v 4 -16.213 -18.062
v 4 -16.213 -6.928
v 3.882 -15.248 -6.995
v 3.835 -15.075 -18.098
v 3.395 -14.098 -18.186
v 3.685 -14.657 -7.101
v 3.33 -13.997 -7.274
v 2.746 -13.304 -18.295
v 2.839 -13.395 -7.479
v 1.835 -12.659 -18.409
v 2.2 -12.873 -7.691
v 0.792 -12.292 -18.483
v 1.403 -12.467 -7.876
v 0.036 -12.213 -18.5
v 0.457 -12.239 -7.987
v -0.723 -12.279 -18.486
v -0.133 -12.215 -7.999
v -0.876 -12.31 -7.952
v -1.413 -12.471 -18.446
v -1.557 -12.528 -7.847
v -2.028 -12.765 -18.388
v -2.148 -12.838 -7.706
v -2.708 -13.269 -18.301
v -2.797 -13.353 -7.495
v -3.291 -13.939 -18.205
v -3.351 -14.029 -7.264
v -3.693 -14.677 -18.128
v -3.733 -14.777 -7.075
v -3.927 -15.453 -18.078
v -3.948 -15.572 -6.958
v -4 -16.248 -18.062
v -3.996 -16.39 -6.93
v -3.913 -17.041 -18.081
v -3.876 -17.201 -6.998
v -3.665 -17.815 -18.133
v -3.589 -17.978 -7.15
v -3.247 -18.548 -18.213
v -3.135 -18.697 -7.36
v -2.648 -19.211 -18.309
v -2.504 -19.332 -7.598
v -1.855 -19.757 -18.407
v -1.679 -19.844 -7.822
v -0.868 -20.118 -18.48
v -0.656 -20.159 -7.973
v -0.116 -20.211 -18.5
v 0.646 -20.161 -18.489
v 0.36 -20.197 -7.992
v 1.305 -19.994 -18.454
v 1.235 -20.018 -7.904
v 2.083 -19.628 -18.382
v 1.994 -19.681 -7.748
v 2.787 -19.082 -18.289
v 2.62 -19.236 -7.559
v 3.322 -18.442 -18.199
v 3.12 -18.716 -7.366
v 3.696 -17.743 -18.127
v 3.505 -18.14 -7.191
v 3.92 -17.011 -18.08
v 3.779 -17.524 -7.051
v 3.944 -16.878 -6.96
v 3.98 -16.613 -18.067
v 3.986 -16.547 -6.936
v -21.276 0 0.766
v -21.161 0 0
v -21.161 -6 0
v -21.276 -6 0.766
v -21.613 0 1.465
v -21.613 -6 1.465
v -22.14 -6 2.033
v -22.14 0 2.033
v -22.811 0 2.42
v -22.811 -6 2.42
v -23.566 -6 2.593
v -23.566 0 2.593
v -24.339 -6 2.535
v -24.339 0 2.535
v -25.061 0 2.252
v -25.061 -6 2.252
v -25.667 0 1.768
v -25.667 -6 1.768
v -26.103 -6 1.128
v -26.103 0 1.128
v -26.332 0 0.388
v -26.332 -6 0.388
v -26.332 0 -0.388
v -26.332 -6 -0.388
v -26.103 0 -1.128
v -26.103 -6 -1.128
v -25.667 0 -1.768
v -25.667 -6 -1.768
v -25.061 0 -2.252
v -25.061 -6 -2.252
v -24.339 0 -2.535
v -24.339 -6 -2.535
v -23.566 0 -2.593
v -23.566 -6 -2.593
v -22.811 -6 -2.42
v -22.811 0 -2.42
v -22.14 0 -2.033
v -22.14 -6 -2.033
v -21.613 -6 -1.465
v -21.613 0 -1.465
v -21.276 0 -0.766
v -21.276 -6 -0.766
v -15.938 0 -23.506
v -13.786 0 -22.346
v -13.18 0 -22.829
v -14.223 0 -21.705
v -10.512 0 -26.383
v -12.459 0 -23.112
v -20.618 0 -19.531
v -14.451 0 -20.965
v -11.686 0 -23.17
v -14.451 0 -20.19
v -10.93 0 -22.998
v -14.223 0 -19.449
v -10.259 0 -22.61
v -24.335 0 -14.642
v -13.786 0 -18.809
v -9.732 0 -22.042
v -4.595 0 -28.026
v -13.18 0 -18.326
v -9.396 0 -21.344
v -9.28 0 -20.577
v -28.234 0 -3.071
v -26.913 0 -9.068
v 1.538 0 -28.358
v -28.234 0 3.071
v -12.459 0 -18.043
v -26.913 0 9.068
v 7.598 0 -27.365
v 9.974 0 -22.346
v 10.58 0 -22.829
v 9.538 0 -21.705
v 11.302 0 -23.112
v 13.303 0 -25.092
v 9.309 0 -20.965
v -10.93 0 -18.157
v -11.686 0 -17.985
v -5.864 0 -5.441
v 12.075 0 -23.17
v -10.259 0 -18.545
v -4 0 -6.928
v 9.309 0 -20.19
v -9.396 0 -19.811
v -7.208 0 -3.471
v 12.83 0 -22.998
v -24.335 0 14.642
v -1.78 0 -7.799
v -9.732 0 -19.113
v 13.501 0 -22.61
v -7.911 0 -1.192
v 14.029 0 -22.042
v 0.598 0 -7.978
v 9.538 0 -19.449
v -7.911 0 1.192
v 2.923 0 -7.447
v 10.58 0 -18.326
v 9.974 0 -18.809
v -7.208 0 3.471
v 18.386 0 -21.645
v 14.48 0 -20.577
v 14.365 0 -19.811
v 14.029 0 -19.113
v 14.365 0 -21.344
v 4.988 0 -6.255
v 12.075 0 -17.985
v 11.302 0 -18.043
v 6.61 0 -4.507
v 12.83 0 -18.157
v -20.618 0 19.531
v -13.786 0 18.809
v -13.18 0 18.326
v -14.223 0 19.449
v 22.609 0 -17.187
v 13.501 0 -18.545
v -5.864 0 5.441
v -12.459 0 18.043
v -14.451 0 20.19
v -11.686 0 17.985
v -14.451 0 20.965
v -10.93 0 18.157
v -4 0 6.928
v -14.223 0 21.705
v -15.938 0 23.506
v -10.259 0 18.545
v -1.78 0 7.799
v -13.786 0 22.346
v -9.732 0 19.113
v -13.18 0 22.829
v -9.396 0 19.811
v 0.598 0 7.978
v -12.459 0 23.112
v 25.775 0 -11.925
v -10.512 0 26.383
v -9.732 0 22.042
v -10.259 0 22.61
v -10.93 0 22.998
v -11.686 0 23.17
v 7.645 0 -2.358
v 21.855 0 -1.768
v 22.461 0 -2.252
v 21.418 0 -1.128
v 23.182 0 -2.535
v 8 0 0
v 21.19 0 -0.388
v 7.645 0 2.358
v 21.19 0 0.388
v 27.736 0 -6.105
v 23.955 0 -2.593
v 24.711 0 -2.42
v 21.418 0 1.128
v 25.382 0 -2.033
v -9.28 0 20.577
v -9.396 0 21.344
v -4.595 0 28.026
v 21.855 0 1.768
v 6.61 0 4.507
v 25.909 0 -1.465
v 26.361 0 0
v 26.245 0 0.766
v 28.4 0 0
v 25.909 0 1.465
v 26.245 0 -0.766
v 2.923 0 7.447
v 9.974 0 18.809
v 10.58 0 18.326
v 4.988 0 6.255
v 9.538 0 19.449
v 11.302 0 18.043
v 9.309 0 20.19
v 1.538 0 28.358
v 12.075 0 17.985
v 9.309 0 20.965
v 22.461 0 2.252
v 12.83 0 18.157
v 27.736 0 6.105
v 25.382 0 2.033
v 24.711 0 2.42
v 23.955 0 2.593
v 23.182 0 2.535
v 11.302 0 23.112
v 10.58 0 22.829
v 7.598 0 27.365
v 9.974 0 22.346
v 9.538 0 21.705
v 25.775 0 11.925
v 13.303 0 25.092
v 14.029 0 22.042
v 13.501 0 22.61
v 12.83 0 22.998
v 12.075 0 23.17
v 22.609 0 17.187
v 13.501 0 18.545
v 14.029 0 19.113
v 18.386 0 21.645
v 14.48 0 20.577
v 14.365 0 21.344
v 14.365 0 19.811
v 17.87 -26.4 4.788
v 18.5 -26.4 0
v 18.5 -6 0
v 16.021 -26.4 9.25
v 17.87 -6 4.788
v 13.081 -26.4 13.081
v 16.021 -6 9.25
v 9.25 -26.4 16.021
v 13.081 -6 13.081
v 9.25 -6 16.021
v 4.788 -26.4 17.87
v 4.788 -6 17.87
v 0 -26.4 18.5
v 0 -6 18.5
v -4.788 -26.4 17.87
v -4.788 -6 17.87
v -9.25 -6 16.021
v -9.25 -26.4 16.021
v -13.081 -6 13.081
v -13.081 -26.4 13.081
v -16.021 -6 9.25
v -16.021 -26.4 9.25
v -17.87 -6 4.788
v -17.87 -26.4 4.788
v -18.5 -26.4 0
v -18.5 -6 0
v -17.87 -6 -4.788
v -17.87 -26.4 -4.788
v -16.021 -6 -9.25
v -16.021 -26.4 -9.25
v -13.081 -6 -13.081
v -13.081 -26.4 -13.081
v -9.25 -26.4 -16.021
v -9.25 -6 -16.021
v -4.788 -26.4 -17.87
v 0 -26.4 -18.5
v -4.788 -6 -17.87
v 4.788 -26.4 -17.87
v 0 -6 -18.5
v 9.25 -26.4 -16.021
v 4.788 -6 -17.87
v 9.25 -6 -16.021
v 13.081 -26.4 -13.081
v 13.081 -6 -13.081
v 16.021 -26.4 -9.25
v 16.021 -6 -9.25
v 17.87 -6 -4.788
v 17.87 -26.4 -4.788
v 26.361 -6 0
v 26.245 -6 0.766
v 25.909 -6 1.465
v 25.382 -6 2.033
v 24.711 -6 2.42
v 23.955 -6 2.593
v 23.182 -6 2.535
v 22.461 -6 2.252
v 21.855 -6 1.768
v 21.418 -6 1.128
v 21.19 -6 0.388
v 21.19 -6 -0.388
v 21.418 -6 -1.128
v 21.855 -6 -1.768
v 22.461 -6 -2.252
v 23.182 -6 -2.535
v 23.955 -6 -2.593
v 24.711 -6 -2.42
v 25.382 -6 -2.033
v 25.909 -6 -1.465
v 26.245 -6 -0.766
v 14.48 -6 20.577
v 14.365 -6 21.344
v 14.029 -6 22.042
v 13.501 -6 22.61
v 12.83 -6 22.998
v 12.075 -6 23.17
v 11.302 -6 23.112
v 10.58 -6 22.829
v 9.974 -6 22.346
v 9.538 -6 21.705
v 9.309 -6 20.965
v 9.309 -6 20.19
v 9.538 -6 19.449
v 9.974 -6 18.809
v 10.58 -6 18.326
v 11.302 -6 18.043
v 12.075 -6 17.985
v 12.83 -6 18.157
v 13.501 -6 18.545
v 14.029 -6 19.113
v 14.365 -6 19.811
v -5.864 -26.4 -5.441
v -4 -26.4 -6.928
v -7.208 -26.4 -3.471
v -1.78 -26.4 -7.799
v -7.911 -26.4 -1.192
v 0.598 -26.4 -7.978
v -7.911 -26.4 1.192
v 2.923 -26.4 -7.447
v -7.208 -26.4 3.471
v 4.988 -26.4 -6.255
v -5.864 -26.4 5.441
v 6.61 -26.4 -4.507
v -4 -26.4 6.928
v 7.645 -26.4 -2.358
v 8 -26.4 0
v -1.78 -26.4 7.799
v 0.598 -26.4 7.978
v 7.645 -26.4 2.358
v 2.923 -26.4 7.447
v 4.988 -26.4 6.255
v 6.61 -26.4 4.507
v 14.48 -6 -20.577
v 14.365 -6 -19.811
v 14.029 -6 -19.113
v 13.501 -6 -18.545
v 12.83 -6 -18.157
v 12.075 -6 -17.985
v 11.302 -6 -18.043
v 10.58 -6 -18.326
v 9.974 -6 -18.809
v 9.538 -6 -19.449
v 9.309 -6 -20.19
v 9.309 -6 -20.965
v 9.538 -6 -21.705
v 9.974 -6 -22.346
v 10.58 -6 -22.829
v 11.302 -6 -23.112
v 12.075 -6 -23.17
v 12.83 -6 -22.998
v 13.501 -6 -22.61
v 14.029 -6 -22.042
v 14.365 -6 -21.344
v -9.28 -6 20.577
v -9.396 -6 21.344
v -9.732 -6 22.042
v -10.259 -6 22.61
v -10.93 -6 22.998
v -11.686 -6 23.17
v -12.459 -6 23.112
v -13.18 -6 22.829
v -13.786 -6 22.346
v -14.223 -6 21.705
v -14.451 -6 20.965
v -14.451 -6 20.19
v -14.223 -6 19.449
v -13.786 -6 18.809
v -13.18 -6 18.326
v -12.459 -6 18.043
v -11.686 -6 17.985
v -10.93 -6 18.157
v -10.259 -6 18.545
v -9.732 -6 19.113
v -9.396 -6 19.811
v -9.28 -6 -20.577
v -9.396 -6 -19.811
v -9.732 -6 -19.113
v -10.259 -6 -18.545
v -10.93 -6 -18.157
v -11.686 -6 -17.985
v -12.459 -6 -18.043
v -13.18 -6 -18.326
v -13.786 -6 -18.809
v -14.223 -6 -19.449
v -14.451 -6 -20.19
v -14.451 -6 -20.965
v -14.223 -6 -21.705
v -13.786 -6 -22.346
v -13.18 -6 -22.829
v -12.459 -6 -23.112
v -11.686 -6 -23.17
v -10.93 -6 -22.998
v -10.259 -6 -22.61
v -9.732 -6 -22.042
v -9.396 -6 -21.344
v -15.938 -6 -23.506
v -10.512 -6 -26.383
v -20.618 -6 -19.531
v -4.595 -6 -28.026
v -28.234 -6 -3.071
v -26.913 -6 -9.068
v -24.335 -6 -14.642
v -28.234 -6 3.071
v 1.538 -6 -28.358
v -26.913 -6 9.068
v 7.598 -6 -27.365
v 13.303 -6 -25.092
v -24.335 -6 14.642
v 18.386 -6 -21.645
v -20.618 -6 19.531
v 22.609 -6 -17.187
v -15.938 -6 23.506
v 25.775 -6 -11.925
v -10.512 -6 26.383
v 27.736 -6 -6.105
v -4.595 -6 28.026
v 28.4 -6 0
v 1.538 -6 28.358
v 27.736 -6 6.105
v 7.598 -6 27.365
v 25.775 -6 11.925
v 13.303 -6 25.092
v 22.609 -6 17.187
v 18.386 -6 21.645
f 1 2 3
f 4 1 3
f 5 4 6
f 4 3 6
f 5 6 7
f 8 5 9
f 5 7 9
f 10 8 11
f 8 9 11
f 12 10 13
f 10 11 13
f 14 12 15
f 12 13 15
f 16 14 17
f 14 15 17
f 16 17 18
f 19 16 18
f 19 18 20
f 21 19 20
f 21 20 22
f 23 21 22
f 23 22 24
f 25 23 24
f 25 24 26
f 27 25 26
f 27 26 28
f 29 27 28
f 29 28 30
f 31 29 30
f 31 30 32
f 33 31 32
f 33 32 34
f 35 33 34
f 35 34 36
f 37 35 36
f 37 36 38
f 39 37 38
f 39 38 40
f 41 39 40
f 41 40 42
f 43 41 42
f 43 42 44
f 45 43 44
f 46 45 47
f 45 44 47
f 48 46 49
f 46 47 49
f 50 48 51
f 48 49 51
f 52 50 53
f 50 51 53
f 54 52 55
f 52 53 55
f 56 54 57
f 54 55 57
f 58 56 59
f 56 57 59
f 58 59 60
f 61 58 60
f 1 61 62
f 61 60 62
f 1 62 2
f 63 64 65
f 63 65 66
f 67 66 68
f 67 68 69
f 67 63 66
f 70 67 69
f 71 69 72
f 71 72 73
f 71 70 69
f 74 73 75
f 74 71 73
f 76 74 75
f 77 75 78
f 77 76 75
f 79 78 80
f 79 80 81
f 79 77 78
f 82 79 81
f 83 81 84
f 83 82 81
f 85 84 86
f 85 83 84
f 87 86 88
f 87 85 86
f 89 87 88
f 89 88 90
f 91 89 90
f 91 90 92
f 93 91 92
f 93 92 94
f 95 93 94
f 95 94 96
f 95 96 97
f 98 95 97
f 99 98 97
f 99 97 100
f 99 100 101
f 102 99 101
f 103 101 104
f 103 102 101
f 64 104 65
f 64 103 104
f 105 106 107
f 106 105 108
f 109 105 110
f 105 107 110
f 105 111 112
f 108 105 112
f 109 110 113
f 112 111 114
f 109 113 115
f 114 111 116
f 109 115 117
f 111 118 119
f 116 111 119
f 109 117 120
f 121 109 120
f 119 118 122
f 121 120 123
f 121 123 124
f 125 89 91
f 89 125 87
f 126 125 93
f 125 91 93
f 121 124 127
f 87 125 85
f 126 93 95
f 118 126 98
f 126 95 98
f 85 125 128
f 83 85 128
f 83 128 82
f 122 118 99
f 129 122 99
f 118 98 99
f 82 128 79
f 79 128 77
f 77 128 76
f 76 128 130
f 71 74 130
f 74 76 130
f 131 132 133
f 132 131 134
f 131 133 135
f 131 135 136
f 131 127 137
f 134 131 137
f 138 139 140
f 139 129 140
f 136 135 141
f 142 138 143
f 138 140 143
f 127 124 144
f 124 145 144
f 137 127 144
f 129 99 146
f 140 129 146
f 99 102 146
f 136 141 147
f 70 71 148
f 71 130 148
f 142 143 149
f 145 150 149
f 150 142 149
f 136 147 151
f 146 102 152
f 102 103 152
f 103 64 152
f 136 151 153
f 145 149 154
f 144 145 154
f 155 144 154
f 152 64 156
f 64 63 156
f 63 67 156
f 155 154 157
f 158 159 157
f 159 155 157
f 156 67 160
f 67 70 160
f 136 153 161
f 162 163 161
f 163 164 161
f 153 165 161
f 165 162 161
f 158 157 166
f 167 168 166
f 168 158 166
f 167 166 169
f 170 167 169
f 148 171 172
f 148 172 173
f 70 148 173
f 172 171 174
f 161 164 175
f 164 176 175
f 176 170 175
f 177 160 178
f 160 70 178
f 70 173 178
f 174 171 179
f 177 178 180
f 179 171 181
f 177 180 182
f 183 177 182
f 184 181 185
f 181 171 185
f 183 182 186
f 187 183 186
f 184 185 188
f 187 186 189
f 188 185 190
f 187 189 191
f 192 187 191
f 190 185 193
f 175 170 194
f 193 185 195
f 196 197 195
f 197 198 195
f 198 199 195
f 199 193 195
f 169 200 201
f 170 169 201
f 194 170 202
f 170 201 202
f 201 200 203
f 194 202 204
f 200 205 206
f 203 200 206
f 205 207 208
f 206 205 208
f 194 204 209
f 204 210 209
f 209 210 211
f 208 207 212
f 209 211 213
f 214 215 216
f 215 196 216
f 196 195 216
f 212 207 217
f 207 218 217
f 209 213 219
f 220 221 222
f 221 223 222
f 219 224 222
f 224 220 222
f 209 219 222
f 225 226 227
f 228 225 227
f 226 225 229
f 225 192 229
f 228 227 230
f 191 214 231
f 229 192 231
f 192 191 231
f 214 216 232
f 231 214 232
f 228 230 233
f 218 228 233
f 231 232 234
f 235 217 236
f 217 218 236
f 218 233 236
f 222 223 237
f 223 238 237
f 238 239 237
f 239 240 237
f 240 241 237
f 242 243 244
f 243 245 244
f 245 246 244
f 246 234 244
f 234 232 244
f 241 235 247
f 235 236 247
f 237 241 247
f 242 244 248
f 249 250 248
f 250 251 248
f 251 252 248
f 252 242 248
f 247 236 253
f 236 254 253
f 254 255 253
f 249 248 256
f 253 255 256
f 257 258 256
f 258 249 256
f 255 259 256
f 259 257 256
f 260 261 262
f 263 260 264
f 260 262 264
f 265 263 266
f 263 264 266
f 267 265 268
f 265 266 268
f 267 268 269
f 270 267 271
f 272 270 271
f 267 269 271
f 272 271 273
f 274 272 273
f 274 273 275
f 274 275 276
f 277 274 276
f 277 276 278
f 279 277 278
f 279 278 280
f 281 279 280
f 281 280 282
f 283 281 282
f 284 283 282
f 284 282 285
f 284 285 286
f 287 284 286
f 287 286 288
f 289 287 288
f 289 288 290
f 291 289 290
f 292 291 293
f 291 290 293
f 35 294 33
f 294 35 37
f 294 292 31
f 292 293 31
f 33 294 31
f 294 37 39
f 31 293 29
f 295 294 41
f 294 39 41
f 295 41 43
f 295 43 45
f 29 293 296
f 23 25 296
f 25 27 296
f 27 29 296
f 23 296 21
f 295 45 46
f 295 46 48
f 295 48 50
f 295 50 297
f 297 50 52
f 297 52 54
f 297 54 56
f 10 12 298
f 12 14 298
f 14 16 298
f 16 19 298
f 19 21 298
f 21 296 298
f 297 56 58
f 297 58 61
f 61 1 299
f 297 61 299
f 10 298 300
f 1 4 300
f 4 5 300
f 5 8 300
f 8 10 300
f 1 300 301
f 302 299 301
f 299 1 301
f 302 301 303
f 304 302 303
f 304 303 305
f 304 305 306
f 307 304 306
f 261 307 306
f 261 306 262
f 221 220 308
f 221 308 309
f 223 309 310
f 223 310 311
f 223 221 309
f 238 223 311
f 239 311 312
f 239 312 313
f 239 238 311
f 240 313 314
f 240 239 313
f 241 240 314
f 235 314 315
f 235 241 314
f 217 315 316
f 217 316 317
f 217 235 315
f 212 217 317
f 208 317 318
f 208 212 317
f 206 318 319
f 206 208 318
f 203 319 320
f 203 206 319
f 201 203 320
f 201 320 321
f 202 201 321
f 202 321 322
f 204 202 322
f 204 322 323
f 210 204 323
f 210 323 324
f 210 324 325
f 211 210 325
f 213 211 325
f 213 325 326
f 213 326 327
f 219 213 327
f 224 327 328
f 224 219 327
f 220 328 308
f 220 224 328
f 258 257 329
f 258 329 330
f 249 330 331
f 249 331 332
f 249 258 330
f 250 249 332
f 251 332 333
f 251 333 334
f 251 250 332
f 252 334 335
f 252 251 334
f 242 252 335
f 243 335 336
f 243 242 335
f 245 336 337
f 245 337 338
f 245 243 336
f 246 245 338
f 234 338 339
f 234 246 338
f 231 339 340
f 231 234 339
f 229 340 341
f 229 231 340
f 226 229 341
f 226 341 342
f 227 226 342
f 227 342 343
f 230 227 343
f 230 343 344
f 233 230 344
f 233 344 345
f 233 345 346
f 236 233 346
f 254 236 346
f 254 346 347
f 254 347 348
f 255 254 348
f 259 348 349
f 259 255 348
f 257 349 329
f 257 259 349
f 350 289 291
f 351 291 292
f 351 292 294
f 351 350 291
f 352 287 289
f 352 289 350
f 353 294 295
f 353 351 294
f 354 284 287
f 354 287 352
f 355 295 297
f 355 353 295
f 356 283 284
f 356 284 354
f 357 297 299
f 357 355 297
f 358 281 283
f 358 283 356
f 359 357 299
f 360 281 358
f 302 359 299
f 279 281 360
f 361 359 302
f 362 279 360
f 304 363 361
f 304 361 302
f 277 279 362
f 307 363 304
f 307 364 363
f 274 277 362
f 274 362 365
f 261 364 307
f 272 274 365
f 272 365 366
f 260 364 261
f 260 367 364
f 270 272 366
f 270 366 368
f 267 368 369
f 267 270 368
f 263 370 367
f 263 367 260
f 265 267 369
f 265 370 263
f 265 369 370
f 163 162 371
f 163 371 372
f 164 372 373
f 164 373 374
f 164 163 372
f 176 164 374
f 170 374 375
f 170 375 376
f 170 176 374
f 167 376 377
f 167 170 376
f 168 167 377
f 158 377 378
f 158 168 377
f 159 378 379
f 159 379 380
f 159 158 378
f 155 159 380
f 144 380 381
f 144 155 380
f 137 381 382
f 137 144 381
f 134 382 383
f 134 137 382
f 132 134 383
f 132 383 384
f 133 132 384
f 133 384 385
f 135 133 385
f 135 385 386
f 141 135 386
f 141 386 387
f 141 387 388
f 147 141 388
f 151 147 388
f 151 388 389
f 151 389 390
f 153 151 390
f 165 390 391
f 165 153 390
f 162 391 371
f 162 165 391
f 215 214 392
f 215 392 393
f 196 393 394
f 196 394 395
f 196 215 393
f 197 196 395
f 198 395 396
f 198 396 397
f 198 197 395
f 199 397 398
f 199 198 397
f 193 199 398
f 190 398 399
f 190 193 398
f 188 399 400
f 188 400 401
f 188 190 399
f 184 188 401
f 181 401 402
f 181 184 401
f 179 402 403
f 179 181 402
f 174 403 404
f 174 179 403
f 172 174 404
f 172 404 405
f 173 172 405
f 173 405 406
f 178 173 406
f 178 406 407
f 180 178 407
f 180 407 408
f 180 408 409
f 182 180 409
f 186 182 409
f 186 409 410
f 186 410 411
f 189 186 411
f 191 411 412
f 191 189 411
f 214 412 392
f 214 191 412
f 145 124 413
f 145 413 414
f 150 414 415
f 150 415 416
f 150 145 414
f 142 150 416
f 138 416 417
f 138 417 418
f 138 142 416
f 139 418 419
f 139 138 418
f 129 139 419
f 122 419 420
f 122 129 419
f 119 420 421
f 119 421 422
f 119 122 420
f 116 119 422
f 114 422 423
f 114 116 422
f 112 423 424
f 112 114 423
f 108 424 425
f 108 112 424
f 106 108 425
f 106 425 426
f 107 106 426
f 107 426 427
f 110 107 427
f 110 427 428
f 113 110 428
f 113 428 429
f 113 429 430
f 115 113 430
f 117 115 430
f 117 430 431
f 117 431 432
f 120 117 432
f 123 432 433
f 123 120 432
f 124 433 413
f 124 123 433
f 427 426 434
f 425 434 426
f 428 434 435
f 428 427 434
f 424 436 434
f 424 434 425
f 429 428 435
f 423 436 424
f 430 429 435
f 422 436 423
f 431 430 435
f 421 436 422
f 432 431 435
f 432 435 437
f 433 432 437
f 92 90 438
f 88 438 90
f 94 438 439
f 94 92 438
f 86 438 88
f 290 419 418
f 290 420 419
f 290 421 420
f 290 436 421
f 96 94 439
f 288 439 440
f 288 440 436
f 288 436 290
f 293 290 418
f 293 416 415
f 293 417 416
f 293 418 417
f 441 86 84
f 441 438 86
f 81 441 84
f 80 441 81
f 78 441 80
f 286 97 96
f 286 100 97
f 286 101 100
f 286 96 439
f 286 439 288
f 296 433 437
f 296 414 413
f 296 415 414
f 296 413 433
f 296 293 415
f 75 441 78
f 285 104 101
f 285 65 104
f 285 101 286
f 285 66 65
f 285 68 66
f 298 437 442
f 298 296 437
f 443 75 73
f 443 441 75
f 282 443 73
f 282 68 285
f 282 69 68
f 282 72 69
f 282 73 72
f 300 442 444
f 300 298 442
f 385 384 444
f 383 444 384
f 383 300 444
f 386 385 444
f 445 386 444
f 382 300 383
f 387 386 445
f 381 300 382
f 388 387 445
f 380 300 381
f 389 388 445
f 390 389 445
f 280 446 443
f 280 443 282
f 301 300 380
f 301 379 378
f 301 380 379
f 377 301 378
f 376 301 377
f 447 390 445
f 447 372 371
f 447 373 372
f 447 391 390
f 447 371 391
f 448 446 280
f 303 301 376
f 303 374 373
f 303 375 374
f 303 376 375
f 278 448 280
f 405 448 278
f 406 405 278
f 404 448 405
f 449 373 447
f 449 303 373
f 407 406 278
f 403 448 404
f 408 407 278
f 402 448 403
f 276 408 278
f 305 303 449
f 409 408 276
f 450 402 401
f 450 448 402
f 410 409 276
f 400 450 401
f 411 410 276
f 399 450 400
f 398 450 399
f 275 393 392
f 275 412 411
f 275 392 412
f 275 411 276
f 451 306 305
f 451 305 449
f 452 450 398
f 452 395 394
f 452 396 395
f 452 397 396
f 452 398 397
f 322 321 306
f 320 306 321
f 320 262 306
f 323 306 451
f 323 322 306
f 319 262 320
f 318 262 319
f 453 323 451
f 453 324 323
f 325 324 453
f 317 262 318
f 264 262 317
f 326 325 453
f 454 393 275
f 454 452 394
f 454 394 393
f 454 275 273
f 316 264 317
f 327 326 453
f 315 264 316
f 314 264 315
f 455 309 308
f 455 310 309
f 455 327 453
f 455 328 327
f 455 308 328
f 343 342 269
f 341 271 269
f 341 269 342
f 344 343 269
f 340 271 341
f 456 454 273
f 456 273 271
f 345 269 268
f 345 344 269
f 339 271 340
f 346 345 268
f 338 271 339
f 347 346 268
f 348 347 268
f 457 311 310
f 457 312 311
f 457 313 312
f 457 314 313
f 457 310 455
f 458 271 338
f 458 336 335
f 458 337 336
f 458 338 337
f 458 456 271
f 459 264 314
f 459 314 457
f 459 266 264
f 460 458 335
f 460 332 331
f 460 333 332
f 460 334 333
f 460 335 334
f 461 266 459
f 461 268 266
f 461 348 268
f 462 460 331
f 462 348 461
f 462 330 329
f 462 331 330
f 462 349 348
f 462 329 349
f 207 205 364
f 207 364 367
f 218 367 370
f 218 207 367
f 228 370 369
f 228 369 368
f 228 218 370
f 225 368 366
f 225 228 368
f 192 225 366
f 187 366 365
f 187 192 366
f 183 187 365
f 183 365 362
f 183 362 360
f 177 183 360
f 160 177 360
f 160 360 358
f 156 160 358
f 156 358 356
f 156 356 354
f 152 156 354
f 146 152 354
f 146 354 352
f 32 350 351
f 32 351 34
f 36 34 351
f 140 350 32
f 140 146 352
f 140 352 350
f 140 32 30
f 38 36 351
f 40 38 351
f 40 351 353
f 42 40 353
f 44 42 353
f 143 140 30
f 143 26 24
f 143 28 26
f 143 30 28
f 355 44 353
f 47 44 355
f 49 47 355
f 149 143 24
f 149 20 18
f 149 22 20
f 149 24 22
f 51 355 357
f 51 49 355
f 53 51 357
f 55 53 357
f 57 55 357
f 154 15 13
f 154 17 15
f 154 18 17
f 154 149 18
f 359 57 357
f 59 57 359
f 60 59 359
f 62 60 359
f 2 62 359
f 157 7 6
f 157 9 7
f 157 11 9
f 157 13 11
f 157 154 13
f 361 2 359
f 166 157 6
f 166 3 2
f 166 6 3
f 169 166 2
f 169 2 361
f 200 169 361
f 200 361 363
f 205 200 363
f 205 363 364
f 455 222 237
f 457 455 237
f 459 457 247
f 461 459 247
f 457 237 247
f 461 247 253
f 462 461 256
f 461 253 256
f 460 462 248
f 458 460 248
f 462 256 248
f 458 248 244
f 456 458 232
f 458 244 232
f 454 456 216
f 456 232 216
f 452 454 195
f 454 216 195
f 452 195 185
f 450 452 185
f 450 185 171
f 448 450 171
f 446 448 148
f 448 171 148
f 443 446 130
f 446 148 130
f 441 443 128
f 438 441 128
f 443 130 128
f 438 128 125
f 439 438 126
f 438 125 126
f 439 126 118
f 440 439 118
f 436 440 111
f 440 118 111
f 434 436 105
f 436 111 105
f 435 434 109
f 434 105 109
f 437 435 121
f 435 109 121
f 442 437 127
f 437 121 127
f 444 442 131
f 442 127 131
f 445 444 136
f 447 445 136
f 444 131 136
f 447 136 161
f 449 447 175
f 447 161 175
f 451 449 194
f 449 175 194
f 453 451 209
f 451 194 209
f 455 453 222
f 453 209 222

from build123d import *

# Parameters (mm, degrees)
F1_R     = 18.5
F4_DEPTH = 26.4
F2_R     = 28.4
F5_DEPTH = 6
F0_R     = 8
F6_DEPTH = 26.4
F3_R     = 2.6
F7_DEPTH = 6
F8_R     = 4
F9_DEPTH = 28


with BuildPart() as f4:
    # F1 (on Front) → F4 (new body)
    with BuildSketch(Plane.XZ):
        Circle(F1_R)
    extrude(amount=F4_DEPTH)

    # F2 (on Front) → F5 (join)
    with BuildSketch(Plane.XZ):
        Circle(F2_R)
    extrude(amount=F5_DEPTH)

    # F0 (on Front) → F6 (cut)
    with BuildSketch(Plane.XZ):
        Circle(F0_R)
    extrude(amount=F6_DEPTH, mode=Mode.SUBTRACT)

    # F3 (on Front) → F7 (cut)
    with BuildSketch(Plane.XZ):
        with Locations((-23.760727, 0)):
            Circle(F3_R)
        with Locations((-11.880363, -20.577393)):
            Circle(F3_R)
        with Locations((11.880363, -20.577393)):
            Circle(F3_R)
        with Locations((23.760727, 0)):
            Circle(F3_R)
        with Locations((11.880363, 20.577393)):
            Circle(F3_R)
        with Locations((-11.880363, 20.577393)):
            Circle(F3_R)
    extrude(amount=F7_DEPTH, mode=Mode.SUBTRACT)

    # F8 (on Top) → F9 (cut)
    with BuildSketch(Plane.XY):
        with Locations((0, -16.212996)):
            Circle(F8_R)
    extrude(amount=-F9_DEPTH, mode=Mode.SUBTRACT)


solid = f4.part
